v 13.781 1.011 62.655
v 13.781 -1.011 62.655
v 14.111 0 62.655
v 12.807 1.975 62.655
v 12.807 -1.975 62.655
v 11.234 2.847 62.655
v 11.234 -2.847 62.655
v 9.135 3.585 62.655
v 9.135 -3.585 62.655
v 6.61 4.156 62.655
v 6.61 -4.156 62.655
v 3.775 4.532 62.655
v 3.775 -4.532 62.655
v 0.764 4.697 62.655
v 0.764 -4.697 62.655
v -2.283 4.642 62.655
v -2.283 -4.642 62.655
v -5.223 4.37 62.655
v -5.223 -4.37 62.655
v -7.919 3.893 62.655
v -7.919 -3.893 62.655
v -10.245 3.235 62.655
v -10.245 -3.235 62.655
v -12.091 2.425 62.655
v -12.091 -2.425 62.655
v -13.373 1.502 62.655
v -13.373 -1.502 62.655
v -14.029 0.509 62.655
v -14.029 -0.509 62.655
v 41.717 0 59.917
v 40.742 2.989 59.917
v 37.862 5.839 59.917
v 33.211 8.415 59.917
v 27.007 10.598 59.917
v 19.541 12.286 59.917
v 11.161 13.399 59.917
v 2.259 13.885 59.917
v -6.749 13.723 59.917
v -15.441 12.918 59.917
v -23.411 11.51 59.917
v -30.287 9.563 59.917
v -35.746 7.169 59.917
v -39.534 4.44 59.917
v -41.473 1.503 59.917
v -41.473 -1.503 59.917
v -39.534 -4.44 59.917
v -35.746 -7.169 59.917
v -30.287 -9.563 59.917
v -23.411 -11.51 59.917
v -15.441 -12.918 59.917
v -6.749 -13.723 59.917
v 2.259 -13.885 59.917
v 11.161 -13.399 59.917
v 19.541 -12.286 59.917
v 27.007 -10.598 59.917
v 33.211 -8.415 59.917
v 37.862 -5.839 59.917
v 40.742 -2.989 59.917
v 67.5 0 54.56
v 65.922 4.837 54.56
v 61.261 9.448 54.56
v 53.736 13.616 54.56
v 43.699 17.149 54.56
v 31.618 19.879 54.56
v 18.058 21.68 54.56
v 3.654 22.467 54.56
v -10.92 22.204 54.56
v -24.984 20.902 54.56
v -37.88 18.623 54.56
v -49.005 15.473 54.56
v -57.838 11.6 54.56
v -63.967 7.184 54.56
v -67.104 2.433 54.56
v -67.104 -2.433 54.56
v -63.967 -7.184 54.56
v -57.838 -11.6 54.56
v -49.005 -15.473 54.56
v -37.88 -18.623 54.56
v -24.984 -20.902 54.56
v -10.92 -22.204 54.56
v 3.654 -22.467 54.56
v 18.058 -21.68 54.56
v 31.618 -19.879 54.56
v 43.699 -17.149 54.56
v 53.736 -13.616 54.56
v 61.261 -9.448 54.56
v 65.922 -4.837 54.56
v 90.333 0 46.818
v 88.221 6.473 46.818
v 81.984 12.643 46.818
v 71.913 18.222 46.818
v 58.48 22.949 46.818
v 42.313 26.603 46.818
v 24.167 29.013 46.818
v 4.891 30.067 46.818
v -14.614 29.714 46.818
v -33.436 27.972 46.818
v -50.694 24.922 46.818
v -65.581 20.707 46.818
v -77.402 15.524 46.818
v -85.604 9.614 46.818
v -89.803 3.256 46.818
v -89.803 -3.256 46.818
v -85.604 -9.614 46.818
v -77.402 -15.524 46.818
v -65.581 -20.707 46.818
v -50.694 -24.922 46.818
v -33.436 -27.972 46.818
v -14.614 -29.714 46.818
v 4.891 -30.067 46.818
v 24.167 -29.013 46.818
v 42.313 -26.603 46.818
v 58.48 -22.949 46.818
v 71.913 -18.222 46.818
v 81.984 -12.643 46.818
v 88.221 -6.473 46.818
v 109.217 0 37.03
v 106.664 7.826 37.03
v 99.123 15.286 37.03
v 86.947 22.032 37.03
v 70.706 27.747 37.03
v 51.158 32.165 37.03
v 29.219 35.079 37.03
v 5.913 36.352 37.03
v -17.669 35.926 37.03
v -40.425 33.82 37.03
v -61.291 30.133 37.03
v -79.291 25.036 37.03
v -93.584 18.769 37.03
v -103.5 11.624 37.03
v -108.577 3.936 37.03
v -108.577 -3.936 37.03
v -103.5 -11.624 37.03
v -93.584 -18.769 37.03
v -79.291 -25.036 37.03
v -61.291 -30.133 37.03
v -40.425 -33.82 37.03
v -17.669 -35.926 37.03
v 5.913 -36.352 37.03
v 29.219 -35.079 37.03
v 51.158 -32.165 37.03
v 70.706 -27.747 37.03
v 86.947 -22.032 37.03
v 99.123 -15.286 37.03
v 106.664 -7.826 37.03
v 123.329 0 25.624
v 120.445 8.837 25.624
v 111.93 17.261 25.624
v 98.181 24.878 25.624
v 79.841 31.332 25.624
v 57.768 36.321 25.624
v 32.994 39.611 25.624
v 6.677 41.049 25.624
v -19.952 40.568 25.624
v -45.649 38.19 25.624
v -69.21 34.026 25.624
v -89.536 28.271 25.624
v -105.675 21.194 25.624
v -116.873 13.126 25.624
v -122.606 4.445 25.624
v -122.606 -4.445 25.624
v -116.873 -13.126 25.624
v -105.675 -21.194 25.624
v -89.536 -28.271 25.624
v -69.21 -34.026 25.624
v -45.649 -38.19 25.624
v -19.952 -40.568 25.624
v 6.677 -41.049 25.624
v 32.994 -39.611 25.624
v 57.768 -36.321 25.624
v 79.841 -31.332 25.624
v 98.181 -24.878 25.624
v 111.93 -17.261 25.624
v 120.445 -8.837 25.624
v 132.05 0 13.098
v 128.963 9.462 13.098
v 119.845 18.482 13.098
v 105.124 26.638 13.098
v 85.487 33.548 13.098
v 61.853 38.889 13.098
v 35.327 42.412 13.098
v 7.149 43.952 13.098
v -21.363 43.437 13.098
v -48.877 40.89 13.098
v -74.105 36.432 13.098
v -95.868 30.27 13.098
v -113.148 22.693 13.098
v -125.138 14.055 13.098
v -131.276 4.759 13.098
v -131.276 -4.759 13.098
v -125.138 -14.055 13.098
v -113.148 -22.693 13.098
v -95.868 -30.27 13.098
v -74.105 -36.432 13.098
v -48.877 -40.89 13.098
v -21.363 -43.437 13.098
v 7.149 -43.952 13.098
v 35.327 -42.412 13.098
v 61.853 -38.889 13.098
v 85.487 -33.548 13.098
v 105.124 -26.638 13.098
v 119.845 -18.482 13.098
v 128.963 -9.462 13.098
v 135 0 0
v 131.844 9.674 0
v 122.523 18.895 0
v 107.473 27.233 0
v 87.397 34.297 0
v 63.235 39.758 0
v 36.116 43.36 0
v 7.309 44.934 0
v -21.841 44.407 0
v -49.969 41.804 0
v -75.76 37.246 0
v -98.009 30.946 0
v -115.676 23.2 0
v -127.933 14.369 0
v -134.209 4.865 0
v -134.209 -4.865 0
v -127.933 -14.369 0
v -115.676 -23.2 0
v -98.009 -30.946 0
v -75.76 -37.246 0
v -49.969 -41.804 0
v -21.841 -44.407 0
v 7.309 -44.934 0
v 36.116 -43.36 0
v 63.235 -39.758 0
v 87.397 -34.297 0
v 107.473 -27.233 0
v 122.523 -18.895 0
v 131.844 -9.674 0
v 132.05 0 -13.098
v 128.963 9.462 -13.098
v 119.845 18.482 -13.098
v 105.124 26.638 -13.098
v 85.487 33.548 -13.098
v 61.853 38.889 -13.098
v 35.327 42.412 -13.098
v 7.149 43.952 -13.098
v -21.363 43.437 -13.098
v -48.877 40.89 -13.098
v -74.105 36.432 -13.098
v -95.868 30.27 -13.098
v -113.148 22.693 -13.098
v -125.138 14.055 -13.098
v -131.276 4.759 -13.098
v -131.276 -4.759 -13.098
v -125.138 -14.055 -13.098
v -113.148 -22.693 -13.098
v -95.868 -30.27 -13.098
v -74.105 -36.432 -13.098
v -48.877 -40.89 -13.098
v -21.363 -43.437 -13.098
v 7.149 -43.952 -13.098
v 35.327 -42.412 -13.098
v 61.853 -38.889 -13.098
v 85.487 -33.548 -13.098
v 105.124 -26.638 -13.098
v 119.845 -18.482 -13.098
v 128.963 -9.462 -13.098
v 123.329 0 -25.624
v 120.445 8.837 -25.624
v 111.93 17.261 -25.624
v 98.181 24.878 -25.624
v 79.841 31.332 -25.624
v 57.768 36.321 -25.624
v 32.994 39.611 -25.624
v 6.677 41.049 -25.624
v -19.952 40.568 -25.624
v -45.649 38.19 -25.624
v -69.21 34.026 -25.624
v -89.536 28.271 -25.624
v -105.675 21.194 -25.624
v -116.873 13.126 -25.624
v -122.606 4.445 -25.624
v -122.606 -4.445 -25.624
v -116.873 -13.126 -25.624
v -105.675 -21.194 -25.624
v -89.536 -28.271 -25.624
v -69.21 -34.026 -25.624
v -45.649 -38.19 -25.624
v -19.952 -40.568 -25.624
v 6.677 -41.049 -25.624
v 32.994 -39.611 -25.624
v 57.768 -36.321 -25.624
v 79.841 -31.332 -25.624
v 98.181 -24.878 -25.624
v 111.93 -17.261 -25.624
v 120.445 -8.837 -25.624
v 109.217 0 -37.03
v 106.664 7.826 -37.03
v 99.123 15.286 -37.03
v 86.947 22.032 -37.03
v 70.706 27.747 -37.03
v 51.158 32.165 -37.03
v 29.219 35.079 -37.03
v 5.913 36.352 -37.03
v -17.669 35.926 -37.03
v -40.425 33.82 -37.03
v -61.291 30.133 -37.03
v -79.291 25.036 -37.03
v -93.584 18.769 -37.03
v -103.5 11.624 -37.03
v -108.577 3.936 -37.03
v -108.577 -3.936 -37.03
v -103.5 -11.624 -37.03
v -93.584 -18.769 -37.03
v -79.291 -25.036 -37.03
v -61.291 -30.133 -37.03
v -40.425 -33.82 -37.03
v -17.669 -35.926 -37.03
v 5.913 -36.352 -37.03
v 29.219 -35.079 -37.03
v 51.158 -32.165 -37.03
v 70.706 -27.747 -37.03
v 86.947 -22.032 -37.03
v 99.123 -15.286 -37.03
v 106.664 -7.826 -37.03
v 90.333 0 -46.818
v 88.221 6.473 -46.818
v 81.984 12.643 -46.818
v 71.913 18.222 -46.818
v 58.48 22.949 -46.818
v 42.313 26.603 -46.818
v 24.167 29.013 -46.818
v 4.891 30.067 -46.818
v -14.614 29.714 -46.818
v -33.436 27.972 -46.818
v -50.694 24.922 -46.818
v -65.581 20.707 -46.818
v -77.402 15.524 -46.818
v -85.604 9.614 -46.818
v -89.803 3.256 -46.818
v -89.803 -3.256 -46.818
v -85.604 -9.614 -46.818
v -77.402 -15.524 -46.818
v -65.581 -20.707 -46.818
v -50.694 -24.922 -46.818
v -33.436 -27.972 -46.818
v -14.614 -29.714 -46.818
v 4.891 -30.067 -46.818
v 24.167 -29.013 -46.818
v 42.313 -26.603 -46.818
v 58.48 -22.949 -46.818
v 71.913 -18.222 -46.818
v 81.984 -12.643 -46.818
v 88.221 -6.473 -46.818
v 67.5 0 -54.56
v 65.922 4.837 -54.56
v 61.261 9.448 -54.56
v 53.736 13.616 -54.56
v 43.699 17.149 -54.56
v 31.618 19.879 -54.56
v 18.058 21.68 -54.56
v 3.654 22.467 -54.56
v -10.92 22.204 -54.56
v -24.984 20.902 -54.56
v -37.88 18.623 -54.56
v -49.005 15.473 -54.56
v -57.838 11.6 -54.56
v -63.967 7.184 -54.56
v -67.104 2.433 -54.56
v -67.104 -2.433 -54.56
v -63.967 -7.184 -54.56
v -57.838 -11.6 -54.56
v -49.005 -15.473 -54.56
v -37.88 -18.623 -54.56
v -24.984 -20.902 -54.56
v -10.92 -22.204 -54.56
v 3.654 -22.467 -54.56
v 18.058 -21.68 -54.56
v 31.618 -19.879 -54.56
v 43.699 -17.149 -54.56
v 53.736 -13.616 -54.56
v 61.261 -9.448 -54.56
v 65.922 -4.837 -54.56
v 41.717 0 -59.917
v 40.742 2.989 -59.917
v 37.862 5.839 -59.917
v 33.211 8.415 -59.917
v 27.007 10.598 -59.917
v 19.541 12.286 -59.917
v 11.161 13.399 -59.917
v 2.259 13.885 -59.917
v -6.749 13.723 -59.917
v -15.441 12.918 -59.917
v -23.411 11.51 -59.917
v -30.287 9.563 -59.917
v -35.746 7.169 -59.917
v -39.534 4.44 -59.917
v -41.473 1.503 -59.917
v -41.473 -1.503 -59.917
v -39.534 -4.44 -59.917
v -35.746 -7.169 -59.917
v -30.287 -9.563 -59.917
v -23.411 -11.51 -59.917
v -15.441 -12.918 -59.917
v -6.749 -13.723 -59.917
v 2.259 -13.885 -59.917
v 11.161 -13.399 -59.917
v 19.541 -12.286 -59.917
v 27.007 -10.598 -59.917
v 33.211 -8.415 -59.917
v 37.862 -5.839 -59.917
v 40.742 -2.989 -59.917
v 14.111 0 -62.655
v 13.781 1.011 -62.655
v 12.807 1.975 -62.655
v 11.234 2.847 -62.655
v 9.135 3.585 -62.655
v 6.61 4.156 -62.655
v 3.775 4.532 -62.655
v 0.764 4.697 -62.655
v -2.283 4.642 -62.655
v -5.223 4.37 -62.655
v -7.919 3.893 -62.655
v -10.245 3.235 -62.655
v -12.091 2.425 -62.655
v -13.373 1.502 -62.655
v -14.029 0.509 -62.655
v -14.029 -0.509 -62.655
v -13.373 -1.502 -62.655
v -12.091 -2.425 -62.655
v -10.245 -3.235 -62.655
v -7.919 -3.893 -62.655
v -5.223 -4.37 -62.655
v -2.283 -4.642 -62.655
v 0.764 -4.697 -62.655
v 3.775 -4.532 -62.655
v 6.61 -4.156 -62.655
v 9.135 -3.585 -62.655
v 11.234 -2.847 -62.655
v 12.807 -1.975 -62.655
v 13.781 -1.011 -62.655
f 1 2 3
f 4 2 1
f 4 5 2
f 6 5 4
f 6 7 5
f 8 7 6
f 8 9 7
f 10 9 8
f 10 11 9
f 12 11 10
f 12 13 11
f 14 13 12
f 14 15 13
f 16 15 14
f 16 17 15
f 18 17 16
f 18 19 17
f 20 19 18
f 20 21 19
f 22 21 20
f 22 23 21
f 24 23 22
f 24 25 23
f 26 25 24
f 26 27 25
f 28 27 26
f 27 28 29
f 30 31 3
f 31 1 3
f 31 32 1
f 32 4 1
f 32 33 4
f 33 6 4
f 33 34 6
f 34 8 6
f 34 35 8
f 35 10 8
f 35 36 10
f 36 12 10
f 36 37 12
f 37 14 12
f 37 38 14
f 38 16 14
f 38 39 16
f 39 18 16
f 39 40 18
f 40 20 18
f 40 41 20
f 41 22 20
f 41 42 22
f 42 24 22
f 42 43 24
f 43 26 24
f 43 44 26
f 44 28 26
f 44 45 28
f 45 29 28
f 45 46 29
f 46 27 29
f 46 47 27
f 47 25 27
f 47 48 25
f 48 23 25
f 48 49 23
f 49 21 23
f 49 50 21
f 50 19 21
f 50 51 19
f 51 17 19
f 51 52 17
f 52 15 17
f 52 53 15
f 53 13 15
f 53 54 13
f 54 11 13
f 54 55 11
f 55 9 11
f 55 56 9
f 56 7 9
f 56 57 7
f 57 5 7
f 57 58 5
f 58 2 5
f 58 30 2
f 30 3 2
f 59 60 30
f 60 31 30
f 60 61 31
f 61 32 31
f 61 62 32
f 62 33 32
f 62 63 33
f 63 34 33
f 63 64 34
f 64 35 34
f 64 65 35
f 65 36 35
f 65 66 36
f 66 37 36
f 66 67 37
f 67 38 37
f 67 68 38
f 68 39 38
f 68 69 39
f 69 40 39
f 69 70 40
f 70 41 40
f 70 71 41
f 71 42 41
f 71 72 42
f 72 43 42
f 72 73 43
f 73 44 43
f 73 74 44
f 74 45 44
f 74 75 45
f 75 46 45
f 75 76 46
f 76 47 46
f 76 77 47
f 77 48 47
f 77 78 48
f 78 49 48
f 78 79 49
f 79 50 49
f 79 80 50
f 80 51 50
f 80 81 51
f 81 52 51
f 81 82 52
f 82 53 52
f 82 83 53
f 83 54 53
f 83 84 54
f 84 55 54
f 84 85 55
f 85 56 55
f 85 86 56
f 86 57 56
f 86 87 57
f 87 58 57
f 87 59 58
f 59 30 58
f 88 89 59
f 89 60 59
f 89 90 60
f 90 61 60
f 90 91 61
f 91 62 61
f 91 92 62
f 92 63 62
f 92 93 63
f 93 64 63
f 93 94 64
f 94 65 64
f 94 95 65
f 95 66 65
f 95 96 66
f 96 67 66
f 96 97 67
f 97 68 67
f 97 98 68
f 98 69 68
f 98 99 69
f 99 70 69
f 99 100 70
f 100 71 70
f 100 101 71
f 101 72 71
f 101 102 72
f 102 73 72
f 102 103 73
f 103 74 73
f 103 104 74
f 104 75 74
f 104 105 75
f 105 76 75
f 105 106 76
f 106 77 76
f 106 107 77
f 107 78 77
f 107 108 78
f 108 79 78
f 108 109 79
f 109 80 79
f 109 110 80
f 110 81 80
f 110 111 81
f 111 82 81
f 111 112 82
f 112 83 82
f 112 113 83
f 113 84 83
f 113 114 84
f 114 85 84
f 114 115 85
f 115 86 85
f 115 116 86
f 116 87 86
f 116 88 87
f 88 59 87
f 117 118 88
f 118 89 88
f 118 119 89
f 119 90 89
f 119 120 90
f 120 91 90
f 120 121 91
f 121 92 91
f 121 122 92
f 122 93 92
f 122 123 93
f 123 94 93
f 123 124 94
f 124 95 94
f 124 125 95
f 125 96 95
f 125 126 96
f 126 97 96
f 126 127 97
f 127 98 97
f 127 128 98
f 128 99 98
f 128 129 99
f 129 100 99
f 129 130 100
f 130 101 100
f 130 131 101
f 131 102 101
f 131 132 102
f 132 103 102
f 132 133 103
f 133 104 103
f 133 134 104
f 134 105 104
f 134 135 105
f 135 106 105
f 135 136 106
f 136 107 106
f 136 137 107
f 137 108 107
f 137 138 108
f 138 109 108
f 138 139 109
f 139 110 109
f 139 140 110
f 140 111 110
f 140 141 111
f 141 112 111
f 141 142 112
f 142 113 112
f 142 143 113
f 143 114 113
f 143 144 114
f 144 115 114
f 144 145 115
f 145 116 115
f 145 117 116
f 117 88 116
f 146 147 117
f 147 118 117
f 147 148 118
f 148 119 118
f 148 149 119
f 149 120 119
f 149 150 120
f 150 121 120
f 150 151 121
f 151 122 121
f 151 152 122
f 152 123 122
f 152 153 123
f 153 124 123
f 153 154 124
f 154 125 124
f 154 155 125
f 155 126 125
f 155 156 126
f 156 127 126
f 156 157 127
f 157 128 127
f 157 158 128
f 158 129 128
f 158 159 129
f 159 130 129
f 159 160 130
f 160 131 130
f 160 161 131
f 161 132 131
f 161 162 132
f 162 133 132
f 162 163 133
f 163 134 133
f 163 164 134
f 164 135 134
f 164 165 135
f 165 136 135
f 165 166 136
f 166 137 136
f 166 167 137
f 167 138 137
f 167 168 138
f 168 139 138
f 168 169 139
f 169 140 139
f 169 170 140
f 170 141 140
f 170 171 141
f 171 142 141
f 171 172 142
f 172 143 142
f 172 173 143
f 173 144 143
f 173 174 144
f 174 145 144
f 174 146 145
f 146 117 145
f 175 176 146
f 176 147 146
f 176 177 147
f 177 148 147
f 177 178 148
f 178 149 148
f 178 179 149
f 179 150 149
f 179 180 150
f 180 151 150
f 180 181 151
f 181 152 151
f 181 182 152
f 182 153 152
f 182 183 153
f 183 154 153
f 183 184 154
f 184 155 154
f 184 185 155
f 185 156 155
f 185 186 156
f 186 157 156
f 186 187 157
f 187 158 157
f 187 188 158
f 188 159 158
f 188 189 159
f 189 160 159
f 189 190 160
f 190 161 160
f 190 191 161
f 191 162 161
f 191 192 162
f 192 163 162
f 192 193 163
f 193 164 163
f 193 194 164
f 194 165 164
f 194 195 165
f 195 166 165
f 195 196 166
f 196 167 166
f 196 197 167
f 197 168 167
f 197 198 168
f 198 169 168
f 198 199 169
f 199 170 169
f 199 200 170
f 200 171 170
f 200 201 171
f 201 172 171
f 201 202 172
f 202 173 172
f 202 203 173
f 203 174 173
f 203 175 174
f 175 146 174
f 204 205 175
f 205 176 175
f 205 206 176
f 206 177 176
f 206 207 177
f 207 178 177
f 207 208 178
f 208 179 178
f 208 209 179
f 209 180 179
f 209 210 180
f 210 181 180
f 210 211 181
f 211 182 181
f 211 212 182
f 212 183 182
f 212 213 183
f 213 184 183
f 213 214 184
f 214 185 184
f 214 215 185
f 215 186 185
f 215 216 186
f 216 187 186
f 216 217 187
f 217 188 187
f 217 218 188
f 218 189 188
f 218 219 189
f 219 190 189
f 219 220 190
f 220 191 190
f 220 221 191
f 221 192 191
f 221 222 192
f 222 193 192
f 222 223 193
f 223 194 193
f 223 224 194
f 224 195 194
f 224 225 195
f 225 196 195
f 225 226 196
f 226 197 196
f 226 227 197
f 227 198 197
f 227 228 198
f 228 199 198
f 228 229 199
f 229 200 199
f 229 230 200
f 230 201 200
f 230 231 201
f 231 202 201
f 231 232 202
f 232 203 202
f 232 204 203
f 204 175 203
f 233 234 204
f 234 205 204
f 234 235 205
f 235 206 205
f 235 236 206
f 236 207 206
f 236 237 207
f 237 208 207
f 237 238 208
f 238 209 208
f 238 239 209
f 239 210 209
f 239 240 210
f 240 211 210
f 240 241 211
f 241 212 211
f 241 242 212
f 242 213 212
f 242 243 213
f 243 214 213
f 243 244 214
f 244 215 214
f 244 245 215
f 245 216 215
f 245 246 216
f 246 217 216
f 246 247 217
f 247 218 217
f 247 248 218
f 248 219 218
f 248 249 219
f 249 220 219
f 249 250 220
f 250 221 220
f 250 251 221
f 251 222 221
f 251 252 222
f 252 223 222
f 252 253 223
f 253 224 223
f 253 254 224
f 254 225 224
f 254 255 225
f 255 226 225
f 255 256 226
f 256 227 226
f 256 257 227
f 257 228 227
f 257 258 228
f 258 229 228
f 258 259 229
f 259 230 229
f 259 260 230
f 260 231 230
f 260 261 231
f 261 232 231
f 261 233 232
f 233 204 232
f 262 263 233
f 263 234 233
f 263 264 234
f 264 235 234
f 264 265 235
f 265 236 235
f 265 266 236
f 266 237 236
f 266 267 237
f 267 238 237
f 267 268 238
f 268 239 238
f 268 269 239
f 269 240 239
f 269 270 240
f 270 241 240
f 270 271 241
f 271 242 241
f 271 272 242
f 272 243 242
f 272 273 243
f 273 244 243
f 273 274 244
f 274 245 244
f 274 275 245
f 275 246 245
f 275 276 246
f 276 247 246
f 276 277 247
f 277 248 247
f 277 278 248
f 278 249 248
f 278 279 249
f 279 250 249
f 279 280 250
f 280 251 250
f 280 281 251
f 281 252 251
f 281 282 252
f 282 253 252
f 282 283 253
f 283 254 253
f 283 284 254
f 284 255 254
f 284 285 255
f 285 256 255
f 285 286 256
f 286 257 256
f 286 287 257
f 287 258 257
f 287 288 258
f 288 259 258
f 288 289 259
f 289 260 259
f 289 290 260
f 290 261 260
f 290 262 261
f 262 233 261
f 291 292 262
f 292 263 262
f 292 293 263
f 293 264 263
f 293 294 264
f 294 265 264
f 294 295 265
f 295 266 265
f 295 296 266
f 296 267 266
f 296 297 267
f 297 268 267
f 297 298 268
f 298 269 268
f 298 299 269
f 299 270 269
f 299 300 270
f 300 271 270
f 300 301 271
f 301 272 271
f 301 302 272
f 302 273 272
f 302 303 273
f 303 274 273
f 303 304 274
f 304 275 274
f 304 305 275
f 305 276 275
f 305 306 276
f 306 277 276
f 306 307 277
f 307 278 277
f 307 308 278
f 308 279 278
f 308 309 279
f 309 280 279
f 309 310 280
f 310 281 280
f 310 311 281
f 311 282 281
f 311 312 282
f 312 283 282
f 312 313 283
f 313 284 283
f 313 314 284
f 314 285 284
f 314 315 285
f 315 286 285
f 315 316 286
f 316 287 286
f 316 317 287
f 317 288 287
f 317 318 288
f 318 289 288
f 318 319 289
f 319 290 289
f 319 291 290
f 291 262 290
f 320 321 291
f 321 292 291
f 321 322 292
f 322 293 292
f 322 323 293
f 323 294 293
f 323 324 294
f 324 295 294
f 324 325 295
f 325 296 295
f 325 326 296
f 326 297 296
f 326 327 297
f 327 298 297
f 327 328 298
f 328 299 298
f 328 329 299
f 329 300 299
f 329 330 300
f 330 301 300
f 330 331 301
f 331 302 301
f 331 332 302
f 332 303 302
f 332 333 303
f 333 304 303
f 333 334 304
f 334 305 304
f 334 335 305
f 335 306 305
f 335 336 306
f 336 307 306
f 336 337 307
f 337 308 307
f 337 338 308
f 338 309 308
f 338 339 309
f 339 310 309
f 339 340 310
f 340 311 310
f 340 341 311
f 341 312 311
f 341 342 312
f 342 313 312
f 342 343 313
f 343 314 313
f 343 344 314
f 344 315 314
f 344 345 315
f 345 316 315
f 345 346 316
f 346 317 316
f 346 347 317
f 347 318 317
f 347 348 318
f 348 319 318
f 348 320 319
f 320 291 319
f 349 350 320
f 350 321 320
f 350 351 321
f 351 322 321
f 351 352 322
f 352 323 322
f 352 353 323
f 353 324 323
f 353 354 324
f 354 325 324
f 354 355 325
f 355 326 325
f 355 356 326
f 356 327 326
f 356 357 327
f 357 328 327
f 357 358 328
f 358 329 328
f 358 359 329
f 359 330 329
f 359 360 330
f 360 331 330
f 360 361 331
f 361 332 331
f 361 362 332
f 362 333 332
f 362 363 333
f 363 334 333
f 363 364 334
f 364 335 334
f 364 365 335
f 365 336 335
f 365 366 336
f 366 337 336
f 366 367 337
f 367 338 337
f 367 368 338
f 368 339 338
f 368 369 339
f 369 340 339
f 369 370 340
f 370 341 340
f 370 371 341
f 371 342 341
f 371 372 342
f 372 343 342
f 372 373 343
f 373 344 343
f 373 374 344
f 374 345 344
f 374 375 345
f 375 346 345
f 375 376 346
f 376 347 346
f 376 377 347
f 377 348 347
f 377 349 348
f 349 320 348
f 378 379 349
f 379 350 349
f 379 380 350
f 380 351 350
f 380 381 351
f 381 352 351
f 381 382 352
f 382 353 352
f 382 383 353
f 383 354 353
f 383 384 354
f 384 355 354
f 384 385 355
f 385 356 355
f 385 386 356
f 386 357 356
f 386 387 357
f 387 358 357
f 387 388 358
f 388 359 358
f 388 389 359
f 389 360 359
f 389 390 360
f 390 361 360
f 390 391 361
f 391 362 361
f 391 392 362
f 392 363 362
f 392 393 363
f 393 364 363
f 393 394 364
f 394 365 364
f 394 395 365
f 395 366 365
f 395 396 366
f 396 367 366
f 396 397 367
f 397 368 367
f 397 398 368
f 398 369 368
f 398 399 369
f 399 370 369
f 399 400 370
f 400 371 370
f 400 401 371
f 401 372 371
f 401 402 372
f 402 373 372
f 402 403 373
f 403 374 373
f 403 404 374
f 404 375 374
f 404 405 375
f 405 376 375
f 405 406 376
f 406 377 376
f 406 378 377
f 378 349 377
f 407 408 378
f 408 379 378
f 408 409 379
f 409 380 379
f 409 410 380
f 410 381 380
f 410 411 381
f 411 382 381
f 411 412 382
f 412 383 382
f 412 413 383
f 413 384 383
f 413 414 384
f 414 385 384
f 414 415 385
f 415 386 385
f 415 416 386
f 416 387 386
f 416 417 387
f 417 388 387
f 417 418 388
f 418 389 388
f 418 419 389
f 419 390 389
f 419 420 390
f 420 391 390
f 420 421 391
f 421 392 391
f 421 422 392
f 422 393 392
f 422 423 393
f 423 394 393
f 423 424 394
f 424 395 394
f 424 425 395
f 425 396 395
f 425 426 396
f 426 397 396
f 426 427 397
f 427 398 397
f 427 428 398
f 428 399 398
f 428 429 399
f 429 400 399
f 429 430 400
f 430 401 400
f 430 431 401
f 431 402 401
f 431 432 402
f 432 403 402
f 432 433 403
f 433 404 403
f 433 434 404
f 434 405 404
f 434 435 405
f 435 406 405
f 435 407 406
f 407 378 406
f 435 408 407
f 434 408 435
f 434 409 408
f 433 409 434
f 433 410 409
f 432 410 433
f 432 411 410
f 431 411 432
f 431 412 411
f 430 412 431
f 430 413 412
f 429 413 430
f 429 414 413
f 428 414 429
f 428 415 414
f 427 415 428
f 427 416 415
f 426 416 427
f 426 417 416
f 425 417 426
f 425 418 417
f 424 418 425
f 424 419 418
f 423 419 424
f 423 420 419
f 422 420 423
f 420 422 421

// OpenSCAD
// Generated by SolidPython 1.0.1 on 2020-07-29 00:46:51


scale(v = [15, 5, 7]) {
	sphere(r = 9);
}
/***********************************************
*********      SolidPython code:      **********
************************************************
 
# import packages: SolidPython
from solid import *
from solid.utils import *
from itertools import chain, combinations, permutations


class Resize:

    def __init__(self, scad_file):
        self.scad_file = scad_file
        #self.scad_file = import_scad(scad_file)
        # cone/cylinder param:
        self.r1 = 0
        self.r2 = 0
        self.h = 0
        # rectangular prism param:
        self.w = 0
        self.l = 0
        # ellipse param:
        self.r = 0

    # import OpenScad code (file name corresponds to shape)


    # classify shape + parameters
    def assign(self, param1, param2, param3):
        if self.scad_file == 'cone.scad':
            self.r1 = param1
            self.r2 = param2
            self.h = param3
        elif self.scad_file == 'cylinder.scad':
            self.r1 = param1
            self.r2 = param2
            self.h = param3
        elif self.scad_file == 'rectangularPrism.scad':
            self.h = param1
            self.l = param2
            self.w = param3
        else:
            self.r = param1
            self.h = param2

    # resize parameters
    def iterate(self):
        x = range(3, 20, 2)
        i = 1
        if self.scad_file == 'cone.scad':
            tempList = list(permutations(x, 2))
            for temp in tempList:
                param1 = temp[0]
                param2 = temp[1]
                filepath = 'produced_scad_files/' + 'cone' + str(param1) + '_' + str(param2) + '_' + '.scad'
                scad_render_to_file(cylinder(h=param1, r1=param2, r2=0), filepath)

        elif self.scad_file == 'cylinder.scad':
            tempList = list(permutations(x, 3))
            for temp in tempList:
                param1 = temp[0]
                param2 = temp[1]
                filepath = 'produced_scad_files/' + 'cylinder' + str(param1) + '_' + str(param2) + '_' + '.scad'
                scad_render_to_file(cylinder(h=param1, r1=param2, r2=param2), filepath)

        elif self.scad_file == 'rectangularPrism.scad':
            tempList = list(permutations(x, 3))
            for temp in tempList:
                param1 = temp[0]
                param2 = temp[1]
                param3 = temp[2]
                filepath = 'produced_scad_files/' + 'rectangularPrism' + str(param1) + '_' + str(param2) + '_' + str(
                    param3) + '.scad'
                scad_render_to_file(cube(size=(param1, param2, param3)), filepath)

        elif self.scad_file == 'ellipse.scad':
            tempList = list(permutations(x, 4))
            for temp in tempList:
                param1 = temp[0]
                param2 = temp[1]
                param3 = temp[2]
                param4 = temp[3]
                filepath = 'produced_scad_files/' + 'ellipse' + str(param1) + '_' + str(param2) + '_' + str(param3) + '_' + str(param4) + '.scad'
                scad_render_to_file(scale([param1, param2, param3])(sphere(r=param4)), filepath)

    def render_to_scadfile(self):
        scad_render_to_file(scad, 'example.scad') 
 
************************************************/
